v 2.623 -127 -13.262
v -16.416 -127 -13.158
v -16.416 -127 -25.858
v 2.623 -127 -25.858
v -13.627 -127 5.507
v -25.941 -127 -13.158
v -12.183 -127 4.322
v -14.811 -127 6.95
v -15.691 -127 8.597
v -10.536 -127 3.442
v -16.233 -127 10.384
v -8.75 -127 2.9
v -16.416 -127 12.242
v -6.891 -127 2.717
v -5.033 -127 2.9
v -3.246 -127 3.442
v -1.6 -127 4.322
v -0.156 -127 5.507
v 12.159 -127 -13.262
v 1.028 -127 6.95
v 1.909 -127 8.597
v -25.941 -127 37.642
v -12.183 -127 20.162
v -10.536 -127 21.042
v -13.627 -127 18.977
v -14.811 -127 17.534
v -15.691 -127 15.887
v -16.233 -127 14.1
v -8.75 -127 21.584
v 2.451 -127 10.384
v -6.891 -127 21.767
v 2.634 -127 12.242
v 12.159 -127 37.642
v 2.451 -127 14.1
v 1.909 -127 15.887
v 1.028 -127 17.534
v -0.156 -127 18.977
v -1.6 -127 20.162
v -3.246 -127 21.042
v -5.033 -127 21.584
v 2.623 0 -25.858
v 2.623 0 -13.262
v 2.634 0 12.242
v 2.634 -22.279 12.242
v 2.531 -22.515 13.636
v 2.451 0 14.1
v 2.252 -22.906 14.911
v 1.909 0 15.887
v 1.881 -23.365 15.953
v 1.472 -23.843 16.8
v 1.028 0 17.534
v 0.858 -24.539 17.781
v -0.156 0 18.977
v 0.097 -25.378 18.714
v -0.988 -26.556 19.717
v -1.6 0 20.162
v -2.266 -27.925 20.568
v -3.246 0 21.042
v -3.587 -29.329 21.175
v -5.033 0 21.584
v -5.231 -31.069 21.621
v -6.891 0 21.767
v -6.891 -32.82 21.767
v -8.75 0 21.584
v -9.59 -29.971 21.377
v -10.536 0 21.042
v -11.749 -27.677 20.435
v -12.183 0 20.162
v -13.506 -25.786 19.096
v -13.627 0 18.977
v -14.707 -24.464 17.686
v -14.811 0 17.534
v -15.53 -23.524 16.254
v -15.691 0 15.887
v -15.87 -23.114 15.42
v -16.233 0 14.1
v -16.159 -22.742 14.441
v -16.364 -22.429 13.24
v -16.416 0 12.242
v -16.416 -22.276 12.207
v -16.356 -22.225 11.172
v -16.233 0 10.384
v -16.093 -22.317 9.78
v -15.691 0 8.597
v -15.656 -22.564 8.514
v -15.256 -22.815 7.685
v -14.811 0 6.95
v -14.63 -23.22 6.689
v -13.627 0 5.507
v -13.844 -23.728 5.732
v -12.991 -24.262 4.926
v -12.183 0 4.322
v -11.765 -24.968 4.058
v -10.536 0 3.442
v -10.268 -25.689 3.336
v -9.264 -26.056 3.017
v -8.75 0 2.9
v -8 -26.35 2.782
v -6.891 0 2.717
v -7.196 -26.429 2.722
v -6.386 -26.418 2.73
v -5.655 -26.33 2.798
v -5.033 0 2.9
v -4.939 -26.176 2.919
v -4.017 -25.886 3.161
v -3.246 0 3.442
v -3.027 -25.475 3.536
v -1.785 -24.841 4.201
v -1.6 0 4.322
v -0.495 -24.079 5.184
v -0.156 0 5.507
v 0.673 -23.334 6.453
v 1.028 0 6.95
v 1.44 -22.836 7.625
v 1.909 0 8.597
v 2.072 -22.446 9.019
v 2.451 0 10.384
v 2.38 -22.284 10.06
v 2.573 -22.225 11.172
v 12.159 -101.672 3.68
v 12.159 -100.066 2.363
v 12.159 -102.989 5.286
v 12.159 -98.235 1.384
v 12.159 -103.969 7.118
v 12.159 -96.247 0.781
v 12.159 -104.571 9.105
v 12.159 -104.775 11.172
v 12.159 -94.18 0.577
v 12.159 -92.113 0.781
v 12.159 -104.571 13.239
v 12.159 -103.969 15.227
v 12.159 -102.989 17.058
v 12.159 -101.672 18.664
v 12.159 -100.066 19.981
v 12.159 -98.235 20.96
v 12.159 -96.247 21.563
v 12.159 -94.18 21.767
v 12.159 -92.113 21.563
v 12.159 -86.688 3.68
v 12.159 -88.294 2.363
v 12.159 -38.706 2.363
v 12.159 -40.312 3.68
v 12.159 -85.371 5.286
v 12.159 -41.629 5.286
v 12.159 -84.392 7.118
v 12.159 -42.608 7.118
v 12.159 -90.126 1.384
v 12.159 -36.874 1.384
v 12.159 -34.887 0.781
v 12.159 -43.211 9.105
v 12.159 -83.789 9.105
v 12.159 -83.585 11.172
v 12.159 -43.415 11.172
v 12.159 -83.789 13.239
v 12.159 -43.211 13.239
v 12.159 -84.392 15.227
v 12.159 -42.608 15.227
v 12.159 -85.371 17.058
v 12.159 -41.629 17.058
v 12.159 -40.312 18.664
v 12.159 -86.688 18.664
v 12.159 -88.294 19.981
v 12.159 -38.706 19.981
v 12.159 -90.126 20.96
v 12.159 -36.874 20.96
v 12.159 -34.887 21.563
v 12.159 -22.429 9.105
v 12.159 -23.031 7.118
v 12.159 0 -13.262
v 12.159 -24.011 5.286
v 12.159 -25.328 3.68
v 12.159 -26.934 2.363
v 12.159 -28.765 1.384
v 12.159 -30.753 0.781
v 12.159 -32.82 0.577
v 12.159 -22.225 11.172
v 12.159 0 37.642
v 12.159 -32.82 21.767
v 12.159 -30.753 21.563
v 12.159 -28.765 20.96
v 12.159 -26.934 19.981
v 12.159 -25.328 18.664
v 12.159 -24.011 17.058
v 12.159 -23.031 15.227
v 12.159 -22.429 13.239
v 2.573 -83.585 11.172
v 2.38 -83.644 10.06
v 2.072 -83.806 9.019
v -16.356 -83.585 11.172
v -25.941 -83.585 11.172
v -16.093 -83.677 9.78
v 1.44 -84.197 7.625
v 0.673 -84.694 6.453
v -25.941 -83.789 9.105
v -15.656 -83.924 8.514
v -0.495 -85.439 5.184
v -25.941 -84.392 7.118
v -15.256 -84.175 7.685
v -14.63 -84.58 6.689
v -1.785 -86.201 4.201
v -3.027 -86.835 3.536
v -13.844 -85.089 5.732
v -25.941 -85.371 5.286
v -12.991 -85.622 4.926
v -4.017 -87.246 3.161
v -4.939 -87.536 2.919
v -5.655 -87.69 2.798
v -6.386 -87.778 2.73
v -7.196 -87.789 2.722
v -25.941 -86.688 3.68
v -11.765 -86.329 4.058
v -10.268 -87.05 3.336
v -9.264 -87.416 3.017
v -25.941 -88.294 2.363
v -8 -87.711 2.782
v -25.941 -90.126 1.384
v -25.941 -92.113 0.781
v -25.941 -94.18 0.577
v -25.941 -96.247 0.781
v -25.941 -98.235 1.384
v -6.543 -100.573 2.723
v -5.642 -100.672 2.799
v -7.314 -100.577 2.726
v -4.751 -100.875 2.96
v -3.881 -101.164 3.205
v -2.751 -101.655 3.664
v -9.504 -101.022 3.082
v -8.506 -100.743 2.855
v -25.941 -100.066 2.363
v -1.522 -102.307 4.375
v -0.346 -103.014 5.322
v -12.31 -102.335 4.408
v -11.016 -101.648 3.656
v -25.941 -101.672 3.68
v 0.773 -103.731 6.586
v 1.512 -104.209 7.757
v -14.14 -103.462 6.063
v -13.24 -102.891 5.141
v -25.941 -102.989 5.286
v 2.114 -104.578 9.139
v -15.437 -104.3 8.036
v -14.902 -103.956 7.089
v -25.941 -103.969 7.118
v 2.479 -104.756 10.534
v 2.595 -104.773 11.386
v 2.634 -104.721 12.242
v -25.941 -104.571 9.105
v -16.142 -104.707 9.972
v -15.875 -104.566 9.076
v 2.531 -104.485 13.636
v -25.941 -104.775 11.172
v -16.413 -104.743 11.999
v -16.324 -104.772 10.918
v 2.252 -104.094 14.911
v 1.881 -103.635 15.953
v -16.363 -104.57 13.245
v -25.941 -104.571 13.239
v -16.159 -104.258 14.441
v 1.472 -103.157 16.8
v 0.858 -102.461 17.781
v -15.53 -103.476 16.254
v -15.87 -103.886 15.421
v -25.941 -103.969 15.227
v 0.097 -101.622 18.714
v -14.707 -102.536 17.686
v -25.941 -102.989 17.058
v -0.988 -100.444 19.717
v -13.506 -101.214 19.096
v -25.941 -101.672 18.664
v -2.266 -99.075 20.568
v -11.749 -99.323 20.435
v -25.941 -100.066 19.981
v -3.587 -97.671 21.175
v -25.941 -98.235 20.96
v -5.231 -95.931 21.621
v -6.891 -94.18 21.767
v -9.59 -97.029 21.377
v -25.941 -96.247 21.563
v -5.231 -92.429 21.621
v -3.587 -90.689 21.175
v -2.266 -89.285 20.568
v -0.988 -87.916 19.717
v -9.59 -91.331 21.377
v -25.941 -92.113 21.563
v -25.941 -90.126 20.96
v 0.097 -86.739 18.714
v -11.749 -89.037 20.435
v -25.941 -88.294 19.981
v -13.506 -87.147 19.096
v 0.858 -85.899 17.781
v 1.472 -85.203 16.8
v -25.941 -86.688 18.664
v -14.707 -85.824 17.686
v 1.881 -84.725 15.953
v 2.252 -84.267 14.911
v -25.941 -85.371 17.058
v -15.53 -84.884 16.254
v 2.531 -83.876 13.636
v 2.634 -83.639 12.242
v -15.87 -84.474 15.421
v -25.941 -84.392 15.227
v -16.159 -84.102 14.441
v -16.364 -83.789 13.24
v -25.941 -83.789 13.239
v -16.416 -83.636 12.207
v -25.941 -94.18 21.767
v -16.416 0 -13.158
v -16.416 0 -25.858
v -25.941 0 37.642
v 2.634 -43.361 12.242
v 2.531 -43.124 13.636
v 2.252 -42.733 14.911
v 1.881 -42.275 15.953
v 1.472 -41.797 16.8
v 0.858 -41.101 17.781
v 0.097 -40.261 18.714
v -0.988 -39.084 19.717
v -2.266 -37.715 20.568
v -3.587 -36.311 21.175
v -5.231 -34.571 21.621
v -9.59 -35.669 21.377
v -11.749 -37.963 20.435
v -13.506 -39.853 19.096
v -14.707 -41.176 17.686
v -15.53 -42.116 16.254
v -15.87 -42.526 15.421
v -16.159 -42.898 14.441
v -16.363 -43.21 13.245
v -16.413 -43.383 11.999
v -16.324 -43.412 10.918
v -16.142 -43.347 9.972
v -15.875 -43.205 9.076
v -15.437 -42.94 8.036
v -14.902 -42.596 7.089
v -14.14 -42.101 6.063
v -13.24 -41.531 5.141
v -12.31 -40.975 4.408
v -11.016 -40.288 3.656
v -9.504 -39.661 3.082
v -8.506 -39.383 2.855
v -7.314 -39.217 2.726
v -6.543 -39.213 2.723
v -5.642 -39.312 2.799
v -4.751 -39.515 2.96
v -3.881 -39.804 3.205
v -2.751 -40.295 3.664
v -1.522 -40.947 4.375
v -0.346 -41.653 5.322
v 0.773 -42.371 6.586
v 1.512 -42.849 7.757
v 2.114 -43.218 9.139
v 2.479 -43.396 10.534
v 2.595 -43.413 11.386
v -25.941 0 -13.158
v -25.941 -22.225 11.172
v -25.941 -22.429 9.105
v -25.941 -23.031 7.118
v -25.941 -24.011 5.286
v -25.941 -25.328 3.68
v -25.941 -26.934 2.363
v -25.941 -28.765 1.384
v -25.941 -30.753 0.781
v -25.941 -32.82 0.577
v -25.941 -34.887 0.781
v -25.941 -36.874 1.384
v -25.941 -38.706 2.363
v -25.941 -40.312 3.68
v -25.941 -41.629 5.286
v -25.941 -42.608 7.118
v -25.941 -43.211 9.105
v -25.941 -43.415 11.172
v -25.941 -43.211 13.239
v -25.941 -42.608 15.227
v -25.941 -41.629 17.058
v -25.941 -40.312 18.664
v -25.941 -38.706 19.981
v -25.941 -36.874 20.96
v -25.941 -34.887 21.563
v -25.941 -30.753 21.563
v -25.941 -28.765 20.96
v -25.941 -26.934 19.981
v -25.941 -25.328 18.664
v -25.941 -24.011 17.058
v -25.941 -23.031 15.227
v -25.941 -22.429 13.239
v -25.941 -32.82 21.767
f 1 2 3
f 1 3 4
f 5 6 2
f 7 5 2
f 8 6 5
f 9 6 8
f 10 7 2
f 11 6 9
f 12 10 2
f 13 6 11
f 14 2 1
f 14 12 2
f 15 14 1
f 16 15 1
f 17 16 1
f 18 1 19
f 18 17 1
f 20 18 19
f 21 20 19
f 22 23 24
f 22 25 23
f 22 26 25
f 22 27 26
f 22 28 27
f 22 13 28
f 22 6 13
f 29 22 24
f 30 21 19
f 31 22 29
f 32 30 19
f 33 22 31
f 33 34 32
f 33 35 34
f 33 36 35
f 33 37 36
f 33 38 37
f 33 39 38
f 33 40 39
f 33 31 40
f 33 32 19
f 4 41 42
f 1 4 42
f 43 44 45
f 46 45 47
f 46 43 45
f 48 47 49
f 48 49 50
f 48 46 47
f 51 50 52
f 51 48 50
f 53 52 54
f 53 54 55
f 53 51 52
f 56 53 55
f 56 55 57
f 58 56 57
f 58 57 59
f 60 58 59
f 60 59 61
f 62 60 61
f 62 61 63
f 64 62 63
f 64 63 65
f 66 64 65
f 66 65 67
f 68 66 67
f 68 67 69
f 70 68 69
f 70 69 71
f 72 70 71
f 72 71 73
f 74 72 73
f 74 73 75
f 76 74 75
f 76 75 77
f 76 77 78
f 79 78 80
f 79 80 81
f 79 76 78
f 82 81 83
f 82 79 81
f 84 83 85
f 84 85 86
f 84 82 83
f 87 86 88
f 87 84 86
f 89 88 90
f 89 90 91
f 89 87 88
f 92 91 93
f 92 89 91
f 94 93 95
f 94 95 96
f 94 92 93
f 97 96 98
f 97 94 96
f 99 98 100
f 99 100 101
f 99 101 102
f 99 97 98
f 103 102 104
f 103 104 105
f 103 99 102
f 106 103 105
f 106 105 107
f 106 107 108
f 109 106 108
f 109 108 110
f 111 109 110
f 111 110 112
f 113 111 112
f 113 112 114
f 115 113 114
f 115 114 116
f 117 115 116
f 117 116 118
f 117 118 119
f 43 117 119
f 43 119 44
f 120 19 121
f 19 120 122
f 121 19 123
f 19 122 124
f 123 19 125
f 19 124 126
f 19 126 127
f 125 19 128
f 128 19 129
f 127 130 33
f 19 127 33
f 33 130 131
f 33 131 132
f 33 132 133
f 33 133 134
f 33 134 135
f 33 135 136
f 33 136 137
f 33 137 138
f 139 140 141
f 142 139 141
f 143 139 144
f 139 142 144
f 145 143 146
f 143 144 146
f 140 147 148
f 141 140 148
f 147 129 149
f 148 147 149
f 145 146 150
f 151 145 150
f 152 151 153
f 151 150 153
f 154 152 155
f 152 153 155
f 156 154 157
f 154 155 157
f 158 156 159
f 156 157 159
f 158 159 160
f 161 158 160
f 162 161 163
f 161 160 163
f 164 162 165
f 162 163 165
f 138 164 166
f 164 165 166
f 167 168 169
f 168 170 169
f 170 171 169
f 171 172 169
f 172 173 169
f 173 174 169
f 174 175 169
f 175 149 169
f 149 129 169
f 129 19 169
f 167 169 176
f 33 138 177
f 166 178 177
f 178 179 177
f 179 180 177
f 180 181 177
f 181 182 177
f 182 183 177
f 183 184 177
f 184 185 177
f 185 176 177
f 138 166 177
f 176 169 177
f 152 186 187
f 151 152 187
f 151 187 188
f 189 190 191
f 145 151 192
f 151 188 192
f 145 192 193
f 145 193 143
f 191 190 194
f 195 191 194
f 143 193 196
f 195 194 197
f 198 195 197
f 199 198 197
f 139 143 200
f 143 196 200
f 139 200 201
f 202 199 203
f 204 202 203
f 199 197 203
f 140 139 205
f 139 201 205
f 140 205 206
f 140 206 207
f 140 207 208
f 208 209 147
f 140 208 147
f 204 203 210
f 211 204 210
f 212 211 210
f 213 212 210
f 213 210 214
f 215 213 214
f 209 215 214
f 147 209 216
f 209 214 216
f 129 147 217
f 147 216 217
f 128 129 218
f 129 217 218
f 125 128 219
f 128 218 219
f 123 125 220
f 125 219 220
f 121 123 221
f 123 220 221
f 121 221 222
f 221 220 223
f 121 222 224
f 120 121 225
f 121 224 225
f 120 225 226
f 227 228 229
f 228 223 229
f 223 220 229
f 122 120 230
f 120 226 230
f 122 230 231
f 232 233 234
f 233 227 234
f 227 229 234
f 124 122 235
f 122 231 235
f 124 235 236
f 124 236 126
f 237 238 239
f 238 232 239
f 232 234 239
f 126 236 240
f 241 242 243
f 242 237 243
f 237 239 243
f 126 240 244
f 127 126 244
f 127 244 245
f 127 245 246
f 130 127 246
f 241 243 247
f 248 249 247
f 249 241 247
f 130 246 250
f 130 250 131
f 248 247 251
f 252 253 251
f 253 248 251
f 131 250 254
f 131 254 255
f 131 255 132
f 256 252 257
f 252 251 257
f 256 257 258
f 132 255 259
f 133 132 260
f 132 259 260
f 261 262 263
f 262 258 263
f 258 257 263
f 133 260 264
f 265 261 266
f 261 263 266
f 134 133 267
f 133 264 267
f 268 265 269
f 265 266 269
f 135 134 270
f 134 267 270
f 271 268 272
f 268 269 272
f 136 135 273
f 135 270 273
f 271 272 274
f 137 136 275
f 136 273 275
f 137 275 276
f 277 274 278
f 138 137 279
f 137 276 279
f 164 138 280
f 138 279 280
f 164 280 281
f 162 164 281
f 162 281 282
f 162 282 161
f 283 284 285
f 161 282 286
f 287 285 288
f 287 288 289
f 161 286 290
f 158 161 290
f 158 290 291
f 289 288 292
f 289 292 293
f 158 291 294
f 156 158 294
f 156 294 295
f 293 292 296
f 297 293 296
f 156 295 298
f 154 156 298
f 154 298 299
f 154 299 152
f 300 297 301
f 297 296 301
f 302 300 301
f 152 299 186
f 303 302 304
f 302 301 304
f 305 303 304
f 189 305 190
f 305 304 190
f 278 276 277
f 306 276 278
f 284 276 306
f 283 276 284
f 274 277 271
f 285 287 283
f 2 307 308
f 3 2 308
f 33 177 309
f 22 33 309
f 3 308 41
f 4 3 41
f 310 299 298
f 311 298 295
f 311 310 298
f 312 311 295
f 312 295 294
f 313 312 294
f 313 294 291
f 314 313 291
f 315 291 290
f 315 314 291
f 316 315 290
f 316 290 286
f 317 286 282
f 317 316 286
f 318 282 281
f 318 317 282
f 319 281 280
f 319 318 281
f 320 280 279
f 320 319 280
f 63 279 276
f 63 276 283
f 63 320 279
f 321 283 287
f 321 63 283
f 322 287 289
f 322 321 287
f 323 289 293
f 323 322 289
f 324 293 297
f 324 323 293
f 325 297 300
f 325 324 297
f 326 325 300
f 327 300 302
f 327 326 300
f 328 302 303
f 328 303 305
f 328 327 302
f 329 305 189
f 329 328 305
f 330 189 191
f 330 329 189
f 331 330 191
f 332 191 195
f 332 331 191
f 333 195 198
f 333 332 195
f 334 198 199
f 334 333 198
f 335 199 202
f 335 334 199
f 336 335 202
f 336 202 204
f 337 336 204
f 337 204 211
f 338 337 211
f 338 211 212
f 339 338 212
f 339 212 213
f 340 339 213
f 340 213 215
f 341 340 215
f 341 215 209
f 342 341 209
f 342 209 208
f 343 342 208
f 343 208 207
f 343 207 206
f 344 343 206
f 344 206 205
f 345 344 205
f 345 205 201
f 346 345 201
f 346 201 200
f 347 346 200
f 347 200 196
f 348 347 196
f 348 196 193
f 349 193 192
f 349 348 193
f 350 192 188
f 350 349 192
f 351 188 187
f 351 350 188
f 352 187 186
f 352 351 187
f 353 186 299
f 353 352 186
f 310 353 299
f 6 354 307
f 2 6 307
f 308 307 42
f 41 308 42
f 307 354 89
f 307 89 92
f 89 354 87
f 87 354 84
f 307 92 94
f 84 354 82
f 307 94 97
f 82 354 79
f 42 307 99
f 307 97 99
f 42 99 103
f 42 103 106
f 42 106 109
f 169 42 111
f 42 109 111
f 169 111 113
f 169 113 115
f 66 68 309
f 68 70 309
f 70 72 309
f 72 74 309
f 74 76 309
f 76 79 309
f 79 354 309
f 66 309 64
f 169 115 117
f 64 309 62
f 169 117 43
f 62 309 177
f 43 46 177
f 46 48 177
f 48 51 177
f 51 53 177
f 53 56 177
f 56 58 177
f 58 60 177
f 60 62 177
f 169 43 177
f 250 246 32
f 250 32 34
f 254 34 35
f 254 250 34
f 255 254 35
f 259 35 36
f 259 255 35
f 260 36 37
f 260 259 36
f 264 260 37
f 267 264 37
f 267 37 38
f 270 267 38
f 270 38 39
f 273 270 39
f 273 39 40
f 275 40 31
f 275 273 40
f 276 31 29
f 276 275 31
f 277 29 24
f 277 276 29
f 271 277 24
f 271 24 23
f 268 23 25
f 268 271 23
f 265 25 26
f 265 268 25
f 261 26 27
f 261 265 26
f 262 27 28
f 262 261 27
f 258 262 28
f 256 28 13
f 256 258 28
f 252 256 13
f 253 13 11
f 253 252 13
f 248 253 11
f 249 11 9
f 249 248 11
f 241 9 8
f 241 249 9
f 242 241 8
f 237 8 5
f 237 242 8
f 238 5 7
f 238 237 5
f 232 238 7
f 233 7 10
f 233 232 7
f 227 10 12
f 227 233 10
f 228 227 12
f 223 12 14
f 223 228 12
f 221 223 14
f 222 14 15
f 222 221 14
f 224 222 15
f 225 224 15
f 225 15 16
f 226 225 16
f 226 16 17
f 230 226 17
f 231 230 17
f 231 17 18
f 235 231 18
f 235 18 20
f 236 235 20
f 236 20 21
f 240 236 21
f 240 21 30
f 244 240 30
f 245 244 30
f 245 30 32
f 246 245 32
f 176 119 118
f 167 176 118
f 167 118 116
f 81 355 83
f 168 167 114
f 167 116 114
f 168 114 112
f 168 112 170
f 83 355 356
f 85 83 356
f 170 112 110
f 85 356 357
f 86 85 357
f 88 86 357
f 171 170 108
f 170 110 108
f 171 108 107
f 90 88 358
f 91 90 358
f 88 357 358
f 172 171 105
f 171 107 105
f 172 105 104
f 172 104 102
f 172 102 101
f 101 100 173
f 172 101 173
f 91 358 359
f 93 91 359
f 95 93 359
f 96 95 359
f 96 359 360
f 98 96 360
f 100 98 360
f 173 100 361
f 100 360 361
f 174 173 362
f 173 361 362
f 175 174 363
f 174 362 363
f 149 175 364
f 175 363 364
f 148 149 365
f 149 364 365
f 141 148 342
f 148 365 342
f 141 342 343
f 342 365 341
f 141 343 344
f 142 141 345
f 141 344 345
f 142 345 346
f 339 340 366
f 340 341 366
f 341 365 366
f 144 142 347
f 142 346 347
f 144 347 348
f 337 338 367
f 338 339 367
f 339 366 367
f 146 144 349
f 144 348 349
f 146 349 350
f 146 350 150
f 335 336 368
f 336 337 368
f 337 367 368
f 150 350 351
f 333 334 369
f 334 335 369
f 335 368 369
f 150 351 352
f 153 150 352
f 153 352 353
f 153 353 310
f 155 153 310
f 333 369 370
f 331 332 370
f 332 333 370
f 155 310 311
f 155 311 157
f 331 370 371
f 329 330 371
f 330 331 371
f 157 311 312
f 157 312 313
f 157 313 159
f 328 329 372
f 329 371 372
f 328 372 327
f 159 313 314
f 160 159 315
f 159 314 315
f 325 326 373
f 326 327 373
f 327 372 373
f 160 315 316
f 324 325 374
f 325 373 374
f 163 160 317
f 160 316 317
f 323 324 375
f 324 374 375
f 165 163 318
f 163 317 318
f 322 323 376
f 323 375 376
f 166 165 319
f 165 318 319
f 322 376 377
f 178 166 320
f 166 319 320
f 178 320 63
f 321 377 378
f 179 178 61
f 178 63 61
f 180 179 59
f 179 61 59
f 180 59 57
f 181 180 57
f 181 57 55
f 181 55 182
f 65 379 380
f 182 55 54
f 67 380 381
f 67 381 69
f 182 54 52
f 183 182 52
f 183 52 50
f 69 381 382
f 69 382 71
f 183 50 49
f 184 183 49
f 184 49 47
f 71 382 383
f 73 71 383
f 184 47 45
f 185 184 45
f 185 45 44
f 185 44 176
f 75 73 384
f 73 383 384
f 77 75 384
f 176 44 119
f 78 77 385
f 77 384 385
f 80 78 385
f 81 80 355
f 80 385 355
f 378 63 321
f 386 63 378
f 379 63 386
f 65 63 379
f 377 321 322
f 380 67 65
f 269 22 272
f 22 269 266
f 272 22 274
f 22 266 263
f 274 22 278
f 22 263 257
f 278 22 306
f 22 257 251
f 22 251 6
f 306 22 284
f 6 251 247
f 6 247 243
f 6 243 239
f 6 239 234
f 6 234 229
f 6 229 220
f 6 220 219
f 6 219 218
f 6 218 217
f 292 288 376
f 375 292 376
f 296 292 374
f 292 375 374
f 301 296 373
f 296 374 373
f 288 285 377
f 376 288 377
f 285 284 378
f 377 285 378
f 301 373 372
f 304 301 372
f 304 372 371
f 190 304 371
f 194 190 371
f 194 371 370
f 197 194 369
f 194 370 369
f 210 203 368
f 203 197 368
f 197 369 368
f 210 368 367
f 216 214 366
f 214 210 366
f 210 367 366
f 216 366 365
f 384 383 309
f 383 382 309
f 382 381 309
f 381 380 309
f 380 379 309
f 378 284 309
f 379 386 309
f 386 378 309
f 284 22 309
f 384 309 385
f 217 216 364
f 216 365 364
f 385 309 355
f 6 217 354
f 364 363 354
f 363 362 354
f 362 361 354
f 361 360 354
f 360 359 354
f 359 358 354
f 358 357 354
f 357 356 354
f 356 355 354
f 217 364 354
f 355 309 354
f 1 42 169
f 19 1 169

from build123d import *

# Parameters (mm, degrees)
F1_DEPTH  = 127
F2_R      = 104.325393
F2_R_2    = 26.179728
F2_R_3    = 10.594913
F3_DEPTH  = 38.1
F3_FACE_R = 10.594913
F4_DEPTH  = 38.1
F5_R      = 9.525
F6_DEPTH  = 127


with BuildPart() as f1:
    # F0 (on Front) → F1 (new body)
    with BuildSketch(Plane.XZ):
        Polygon((12.158688, 37.641967), (-25.941312, 37.641967), (-25.941312, -13.158033), (-16.416312, -13.158033), (-16.416312, -25.858033), (2.62328, -25.858033), (2.62328, -13.26213), (12.158688, -13.26213), align=None)
    extrude(amount=F1_DEPTH)

    # F2 (on Right) → F3 (cut)
    with BuildSketch(Plane.YZ):
        with Locations((-442.556002, 14.38355)):
            Circle(F2_R)
        with Locations((196.325033, 10.431935)):
            Circle(F2_R_2)
        with Locations((-94.180087, 11.172054)):
            Circle(F2_R_3)
        with Locations((-32.819913, 11.172054)):
            Circle(F2_R_3)
    extrude(amount=-F3_DEPTH, mode=Mode.SUBTRACT)

    # F3_face (on face) → F4 (cut)
    with BuildSketch(Plane(origin=(0, -32.819913, 11.172054), x_dir=(0, 1, 0), z_dir=(-1, 0, 0))):
        Circle(F3_FACE_R)
        with Locations((-61.360174, 0)):
            Circle(F3_FACE_R)
    extrude(amount=-F4_DEPTH, mode=Mode.SUBTRACT)

    # F5 (on Front) → F6 (cut)
    with BuildSketch(Plane.XZ):
        with Locations((-6.891312, 12.241967)):
            Circle(F5_R)
    extrude(amount=F6_DEPTH, mode=Mode.SUBTRACT)


solid = f1.part
